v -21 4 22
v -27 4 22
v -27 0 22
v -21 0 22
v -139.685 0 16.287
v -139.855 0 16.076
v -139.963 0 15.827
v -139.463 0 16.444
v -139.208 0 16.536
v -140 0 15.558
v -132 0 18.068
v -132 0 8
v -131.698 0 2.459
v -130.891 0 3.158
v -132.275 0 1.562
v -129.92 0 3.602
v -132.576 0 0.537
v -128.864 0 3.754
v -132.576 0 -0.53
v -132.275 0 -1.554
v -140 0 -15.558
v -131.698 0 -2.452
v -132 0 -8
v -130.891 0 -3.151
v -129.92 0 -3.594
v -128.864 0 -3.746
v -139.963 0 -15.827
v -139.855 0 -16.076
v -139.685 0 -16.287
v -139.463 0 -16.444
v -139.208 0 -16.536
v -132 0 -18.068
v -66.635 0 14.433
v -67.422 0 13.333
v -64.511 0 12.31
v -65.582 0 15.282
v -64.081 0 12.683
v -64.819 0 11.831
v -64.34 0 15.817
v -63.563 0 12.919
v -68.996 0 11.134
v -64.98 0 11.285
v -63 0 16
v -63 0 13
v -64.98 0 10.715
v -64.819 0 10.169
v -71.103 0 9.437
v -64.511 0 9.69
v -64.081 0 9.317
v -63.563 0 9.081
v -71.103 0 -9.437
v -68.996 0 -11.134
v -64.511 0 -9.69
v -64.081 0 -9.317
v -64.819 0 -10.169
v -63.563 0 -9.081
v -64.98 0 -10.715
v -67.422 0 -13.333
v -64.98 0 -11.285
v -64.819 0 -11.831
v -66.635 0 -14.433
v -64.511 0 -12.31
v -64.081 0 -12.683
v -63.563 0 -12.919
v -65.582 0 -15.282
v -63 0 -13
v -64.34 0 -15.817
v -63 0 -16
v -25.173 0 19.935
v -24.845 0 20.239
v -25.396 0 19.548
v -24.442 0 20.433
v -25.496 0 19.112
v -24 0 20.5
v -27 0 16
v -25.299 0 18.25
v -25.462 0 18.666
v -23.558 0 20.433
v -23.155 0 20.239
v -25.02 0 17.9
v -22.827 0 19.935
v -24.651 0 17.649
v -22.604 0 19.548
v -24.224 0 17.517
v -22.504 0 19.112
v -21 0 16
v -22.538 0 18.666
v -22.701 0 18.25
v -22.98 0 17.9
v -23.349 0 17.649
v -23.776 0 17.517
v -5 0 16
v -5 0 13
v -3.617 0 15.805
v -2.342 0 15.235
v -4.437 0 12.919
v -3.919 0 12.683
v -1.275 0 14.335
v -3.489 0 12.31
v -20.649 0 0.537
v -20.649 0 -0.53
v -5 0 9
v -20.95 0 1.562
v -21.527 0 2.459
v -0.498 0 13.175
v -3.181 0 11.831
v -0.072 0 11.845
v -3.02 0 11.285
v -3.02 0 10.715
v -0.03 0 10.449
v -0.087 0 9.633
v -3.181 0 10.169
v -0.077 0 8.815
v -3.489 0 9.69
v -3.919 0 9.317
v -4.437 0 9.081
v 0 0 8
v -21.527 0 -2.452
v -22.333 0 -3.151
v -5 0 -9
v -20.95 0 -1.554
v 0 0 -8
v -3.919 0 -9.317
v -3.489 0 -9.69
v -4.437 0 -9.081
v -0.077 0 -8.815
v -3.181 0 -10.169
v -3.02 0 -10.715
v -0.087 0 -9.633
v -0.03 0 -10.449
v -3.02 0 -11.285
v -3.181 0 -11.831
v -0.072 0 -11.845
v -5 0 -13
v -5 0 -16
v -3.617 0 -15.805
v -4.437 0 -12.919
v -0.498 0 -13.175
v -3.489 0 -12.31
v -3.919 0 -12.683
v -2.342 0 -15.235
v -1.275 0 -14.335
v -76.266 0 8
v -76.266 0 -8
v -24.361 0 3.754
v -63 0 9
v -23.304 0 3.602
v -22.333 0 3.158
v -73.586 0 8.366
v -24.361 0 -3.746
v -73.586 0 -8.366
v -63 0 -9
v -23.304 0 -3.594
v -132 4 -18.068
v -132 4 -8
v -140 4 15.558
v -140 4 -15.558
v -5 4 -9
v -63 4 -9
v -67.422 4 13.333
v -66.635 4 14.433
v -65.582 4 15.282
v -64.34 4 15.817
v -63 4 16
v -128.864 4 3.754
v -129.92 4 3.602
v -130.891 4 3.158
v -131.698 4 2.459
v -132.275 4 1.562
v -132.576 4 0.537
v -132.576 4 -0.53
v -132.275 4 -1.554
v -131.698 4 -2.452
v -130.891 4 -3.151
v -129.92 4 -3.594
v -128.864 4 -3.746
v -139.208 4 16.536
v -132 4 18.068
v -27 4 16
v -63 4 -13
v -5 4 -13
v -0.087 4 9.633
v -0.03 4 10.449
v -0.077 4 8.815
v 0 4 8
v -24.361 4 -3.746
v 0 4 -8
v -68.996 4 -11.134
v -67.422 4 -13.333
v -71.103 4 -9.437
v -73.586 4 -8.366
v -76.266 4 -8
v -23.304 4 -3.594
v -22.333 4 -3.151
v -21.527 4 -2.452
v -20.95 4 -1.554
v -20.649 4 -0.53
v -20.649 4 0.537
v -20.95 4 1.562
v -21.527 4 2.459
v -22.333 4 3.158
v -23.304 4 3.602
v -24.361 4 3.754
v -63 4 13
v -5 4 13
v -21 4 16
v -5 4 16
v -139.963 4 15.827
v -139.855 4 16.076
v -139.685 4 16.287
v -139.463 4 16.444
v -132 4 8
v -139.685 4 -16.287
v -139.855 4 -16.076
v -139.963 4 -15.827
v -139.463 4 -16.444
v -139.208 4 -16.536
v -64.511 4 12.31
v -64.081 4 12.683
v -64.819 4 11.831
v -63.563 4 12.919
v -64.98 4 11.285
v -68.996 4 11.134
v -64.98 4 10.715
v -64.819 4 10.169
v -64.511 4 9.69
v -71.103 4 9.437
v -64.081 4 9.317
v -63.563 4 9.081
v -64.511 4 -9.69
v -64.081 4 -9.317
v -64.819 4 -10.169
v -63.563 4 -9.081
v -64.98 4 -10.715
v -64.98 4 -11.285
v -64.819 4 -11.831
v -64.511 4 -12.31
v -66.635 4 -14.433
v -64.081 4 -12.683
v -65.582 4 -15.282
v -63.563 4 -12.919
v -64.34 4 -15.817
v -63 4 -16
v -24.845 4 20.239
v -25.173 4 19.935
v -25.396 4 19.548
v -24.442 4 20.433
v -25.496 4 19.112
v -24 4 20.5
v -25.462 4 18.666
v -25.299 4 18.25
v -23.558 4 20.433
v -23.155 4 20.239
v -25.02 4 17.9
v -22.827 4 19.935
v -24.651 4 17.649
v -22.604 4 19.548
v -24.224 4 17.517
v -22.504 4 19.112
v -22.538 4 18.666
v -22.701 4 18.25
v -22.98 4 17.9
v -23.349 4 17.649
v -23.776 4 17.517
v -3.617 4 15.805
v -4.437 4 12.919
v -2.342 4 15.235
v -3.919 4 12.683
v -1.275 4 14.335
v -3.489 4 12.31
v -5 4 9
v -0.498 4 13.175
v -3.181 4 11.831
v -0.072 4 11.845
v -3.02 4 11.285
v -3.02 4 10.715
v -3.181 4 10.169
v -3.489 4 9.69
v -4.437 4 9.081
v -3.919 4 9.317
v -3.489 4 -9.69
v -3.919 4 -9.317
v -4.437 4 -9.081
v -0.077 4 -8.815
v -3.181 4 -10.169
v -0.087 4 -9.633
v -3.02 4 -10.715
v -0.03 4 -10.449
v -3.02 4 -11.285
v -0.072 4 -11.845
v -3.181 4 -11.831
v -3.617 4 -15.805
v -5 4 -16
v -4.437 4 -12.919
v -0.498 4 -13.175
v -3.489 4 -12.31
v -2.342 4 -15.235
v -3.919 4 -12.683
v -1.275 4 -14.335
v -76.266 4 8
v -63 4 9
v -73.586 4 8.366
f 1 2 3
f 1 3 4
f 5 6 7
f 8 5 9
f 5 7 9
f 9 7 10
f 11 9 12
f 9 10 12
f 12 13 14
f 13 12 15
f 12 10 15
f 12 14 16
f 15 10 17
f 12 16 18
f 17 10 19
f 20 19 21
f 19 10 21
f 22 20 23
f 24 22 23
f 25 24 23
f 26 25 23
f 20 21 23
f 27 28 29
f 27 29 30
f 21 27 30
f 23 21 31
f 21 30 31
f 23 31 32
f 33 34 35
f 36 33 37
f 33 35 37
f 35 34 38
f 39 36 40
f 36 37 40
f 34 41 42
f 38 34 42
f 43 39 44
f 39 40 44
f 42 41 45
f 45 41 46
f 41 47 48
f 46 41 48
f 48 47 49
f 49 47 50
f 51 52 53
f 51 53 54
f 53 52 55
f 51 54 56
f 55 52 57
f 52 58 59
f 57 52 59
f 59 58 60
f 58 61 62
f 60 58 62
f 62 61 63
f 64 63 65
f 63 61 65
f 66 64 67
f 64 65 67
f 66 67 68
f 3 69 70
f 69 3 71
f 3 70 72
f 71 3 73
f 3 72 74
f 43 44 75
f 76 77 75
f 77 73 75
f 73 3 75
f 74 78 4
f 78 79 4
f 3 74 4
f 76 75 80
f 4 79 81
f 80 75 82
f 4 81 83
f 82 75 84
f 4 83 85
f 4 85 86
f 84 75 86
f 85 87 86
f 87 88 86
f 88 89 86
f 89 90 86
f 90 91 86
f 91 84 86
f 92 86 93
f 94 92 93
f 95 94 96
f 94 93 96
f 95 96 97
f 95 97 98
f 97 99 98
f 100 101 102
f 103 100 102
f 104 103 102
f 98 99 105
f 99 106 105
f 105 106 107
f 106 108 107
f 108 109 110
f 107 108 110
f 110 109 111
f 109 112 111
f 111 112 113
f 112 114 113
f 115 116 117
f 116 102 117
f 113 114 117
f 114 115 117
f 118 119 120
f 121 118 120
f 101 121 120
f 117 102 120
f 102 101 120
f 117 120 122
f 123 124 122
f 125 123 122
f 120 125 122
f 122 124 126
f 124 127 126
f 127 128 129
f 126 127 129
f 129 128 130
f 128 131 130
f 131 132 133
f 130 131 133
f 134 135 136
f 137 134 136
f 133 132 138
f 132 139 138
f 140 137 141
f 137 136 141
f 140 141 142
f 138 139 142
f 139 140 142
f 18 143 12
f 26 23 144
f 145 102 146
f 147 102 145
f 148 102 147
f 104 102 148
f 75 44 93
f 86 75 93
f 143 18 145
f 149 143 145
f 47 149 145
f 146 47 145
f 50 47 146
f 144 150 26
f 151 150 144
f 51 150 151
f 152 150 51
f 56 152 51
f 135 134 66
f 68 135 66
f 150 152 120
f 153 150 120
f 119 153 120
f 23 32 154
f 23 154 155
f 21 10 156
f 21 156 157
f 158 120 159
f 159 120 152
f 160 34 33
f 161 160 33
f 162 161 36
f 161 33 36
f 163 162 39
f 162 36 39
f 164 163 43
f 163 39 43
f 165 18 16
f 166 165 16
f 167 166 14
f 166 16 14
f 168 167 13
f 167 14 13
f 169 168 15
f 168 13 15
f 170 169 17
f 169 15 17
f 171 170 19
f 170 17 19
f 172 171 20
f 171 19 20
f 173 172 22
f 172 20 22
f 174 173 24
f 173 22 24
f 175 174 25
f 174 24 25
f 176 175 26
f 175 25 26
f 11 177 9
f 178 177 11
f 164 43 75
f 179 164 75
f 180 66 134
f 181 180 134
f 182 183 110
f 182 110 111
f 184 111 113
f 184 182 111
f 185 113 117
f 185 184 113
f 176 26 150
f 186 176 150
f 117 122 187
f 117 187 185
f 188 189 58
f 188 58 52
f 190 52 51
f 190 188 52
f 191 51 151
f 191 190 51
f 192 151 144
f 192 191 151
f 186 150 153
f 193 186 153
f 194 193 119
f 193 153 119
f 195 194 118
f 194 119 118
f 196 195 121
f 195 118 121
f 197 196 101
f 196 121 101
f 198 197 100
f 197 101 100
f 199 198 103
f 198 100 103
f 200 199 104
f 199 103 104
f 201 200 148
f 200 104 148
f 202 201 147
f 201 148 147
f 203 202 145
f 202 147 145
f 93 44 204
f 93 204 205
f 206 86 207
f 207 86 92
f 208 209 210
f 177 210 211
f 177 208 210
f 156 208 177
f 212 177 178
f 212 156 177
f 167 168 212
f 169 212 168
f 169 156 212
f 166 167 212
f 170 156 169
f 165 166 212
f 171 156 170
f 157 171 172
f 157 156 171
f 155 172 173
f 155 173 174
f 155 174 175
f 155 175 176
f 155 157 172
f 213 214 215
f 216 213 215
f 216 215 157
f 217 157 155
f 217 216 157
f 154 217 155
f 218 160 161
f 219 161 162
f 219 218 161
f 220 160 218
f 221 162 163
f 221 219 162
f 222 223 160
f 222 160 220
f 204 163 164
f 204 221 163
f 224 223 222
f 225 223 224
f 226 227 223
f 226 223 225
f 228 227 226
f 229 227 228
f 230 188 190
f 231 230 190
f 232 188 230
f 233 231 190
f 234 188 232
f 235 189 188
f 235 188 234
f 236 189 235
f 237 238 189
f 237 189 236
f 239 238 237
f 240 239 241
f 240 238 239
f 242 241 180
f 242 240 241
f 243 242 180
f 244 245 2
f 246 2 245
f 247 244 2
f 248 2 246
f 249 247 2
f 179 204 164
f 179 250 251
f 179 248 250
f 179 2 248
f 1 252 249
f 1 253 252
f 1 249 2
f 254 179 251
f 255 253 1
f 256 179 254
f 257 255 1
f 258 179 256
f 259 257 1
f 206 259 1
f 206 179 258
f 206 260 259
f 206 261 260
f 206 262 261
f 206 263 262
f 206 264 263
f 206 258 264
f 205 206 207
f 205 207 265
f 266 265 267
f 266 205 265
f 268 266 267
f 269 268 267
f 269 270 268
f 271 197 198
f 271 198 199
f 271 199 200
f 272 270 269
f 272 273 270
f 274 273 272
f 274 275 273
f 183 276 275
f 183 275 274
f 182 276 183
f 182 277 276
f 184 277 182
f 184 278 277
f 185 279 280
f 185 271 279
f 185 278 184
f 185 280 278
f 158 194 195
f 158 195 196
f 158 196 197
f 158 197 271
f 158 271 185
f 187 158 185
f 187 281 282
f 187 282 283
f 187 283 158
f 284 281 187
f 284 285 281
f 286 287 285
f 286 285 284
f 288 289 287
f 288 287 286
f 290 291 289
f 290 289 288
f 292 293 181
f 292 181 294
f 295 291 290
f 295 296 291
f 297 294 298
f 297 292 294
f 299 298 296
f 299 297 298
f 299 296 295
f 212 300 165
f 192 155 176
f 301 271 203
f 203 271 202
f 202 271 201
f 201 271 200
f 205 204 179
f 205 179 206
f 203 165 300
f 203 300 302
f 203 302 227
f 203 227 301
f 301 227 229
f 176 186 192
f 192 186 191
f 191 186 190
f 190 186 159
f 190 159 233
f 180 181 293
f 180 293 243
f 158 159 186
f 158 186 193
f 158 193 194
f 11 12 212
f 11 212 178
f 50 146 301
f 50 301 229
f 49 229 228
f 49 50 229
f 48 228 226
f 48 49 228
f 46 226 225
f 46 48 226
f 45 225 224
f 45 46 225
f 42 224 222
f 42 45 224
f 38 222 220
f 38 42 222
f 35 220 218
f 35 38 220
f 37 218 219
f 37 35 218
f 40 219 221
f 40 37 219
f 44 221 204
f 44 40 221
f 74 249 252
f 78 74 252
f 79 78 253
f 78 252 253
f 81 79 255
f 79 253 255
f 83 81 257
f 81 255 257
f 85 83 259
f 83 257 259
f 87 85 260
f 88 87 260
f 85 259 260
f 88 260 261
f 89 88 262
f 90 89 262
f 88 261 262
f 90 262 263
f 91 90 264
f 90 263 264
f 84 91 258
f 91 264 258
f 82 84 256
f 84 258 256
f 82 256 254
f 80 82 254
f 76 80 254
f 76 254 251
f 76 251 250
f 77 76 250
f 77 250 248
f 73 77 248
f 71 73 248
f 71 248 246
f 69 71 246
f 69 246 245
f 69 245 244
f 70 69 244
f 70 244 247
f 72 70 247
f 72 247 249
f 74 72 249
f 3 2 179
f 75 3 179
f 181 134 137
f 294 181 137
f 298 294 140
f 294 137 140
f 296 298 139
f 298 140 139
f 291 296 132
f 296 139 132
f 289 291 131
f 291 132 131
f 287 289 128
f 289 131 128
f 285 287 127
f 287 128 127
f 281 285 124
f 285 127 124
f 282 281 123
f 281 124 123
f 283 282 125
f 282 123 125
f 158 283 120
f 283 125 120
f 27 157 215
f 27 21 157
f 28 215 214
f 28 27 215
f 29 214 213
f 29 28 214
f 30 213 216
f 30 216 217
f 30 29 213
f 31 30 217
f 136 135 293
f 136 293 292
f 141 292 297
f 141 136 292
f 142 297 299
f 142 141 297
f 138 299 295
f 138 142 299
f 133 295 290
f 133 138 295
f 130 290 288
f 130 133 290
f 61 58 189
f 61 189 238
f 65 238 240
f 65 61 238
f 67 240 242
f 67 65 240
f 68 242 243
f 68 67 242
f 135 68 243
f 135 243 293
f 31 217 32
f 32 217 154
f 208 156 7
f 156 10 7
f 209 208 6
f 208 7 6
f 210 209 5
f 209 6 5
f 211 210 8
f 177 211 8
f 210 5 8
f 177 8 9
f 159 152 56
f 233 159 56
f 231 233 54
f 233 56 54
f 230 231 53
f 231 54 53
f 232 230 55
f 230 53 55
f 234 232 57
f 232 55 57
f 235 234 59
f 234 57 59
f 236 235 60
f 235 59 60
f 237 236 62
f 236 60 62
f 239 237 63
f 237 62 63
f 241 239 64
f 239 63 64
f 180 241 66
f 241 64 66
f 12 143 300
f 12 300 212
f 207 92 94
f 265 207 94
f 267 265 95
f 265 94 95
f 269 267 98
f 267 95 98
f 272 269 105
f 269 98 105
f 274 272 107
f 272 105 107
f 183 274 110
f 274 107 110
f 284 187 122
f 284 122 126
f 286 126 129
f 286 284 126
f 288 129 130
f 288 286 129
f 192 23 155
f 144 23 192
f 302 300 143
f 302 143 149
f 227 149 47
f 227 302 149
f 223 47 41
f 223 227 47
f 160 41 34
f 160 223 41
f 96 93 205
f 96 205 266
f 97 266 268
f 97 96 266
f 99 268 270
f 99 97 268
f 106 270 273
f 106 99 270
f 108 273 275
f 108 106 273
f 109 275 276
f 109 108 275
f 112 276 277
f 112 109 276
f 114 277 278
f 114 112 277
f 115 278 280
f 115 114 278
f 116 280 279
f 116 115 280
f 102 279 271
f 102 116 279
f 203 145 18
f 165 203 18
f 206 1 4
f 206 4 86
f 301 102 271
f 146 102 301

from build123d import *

# Parameters (mm, degrees)
EXTRUDE_1_DEPTH     = 4
EXTRUDE_2_DEPTH     = 4
FILLET_1_R          = 10
CUT_EXTRUDE_1_DEPTH = 142.340015565
SKETCH_4_W          = 6
SKETCH_4_H          = 6
EXTRUDE_7_DEPTH     = 4
SKETCH_6_R          = 1.5
CUT_EXTRUDE_4_DEPTH = 142.774468788
CUT_EXTRUDE_5_DEPTH = 142.774468788
FILLET_5_R          = 1
FILLET_6_R          = 1


with BuildPart() as part:
    # Эскиз1 → Бобышка-Вытянуть1 (new body)
    with BuildSketch(Plane(origin=(0, 0, 0), x_dir=(1, 0, 0), z_dir=(0, 1, 0))):
        Polygon((-140, -17), (-140, 17), (-138, 19), (-132, 19), (-132, 8), (0, 8), (0, -8), (-132, -8), (-132, -19), (-138, -19), align=None)
    extrude(amount=EXTRUDE_1_DEPTH)

    # Эскиз2 → Бобышка-Вытянуть2 (add)
    # profile 1 of 2: a face of its own
    with BuildSketch(Plane.XZ):
        with BuildLine():
            Line((-63, 16), (-5, 16))
            ThreePointArc((-5, 16), (0, 11), (-5, 6))
            Line((-5, 6), (-63, 6))
            ThreePointArc((-63, 6), (-68, 11), (-63, 16))
        make_face()
        with BuildLine():
            Line((-63, 13), (-5, 13))
            ThreePointArc((-5, 13), (-3, 11), (-5, 9))
            Line((-5, 9), (-63, 9))
            ThreePointArc((-63, 9), (-65, 11), (-63, 13))
        make_face(mode=Mode.SUBTRACT)
    # profile 2 of 2: a face of its own
    with BuildSketch(Plane.XZ):
        with BuildLine():
            Line((-63, -16), (-5, -16))
            ThreePointArc((-5, -16), (0, -11), (-5, -6))
            Line((-5, -6), (-63, -6))
            ThreePointArc((-63, -6), (-68, -11), (-63, -16))
        make_face()
        with BuildLine():
            Line((-63, -13), (-5, -13))
            ThreePointArc((-5, -13), (-3, -11), (-5, -9))
            Line((-5, -9), (-63, -9))
            ThreePointArc((-63, -9), (-65, -11), (-63, -13))
        make_face(mode=Mode.SUBTRACT)
    extrude(amount=-EXTRUDE_2_DEPTH)

    # Скругление1
    # the kernel refuses this fillet: 10 mm, written as the material it adds along each edge
    with BuildSketch(Plane(origin=(-1, 4, 8), x_dir=(1, 0, 0), z_dir=(0, -1, 0))) as fillet_1_piece_1:
        with BuildLine():
            CenterArc((10.90874153, 1.347902551), FILLET_1_R, 173.676623786, 14.069867748)
            Line((0.96958051, 2.44930085), (0.77079729, 2.471328816))
            ThreePointArc((0.77079729, 2.471328816), (0.463030841, 1.233264109), (-0.16, 0.12))
            Line((-0.16, 0.12), (0, -0.2))
            ThreePointArc((0, -0.2), (0.5, -0.2), (0.801825169, -0.026958051))
            Line((0.801825169, -0.026958051), (1, 0))
        make_face()
    extrude(amount=4)
    with BuildSketch(Plane(origin=(-67, 4, 8), x_dir=(-1, 0, 0), z_dir=(0, -1, 0))) as fillet_1_piece_2:
        with BuildLine():
            CenterArc((9.266499161, -10), FILLET_1_R, 90, 62.181860715)
            Line((0.422166387, -5.333333333), (0.245279732, -5.24))
            ThreePointArc((0.245279732, -5.24), (0.785032611, -2.621235013), (-0.16, -0.12))
            Line((-0.16, -0.12), (0, 0.2))
            Line((0, 0.2), (9.266499161, 0.2))
            Line((9.266499161, 0.2), (9.266499161, 0))
        make_face()
    extrude(amount=4)
    with BuildSketch(Plane(origin=(-1, 4, -8), x_dir=(1, 0, 0), z_dir=(0, -1, 0))) as fillet_1_piece_3:
        with BuildLine():
            CenterArc((10.90874153, -1.347902551), FILLET_1_R, 172.253508466, 14.069867748)
            Line((0.96958051, -2.44930085), (0.77079729, -2.471328816))
            ThreePointArc((0.77079729, -2.471328816), (0.463030841, -1.233264109), (-0.16, -0.12))
            Line((-0.16, -0.12), (0, 0.2))
            ThreePointArc((0, 0.2), (0.5, 0.2), (0.801825169, 0.026958051))
            Line((0.801825169, 0.026958051), (1, 0))
        make_face()
    extrude(amount=4)
    with BuildSketch(Plane(origin=(-67, 4, -8), x_dir=(-1, 0, 0), z_dir=(0, -1, 0))) as fillet_1_piece_4:
        with BuildLine():
            CenterArc((9.266499161, 10), FILLET_1_R, 207.818139285, 62.181860715)
            Line((0.422166387, 5.333333333), (0.245279732, 5.24))
            ThreePointArc((0.245279732, 5.24), (0.785032611, 2.621235013), (-0.16, 0.12))
            Line((-0.16, 0.12), (0, -0.2))
            Line((0, -0.2), (9.266499161, -0.2))
            Line((9.266499161, -0.2), (9.266499161, 0))
        make_face()
    extrude(amount=4)

    # Эскиз3 → Вырез-Вытянуть1 (cut, through all)
    with BuildSketch(Plane.XZ):
        with BuildLine():
            Line((-24.36067626, 3.753765504), (-128.863745401, 3.753765504))
            ThreePointArc((-128.863745401, 3.753765504), (-132.613745401, 0.003765504), (-128.863745401, -3.746234496))
            Line((-128.863745401, -3.746234496), (-24.36067626, -3.746234496))
            ThreePointArc((-24.36067626, -3.746234496), (-20.61067626, 0.003765504), (-24.36067626, 3.753765504))
        make_face()
    extrude(amount=-CUT_EXTRUDE_1_DEPTH, mode=Mode.SUBTRACT)

    # Эскиз4 → Бобышка-Вытянуть7 (add)
    with BuildSketch(Plane(origin=(0, 4, 0), x_dir=(1, 0, 0), z_dir=(0, 1, 0))):
        with Locations((-24, -19)):
            Rectangle(SKETCH_4_W, SKETCH_4_H)
    extrude(amount=-EXTRUDE_7_DEPTH)

    # Эскиз6 → Вырез-Вытянуть4 (cut, through all)
    with BuildSketch(Plane(origin=(0, 4, 0), x_dir=(1, 0, 0), z_dir=(0, 1, 0))):
        with Locations(Location((-24, -19, 0), (0, 0, 270))):
            Circle(SKETCH_6_R)
    extrude(amount=-CUT_EXTRUDE_4_DEPTH, mode=Mode.SUBTRACT)

    # Эскиз7 → Вырез-Вытянуть5 (cut, through all)
    with BuildSketch(Plane(origin=(0, 4, 0), x_dir=(1, 0, 0), z_dir=(0, 1, 0))):
        Polygon((-140, 16.36754244), (-131.974442882, 18.073427267), (-132, 19), (-138, 19), (-140, 17), align=None)
    cut_extrude_5 = extrude(amount=-CUT_EXTRUDE_5_DEPTH, mode=Mode.SUBTRACT)

    # Скругление5
    fillet_5_edges = [part.edges().sort_by_distance(p)[0] for p in [
        (-140, 2, -16.36754244),
    ]]
    fillet(fillet_5_edges, radius=FILLET_5_R)

    # Зеркальное отражение5: Вырез-Вытянуть5 across plane
    add(cut_extrude_5.mirror(Plane.XY), mode=Mode.SUBTRACT)

    # Скругление6
    fillet_6_edges = [part.edges().sort_by_distance(p)[0] for p in [
        (-140, 2, 16.36754244),
    ]]
    fillet(fillet_6_edges, radius=FILLET_6_R)


solid = part.part
